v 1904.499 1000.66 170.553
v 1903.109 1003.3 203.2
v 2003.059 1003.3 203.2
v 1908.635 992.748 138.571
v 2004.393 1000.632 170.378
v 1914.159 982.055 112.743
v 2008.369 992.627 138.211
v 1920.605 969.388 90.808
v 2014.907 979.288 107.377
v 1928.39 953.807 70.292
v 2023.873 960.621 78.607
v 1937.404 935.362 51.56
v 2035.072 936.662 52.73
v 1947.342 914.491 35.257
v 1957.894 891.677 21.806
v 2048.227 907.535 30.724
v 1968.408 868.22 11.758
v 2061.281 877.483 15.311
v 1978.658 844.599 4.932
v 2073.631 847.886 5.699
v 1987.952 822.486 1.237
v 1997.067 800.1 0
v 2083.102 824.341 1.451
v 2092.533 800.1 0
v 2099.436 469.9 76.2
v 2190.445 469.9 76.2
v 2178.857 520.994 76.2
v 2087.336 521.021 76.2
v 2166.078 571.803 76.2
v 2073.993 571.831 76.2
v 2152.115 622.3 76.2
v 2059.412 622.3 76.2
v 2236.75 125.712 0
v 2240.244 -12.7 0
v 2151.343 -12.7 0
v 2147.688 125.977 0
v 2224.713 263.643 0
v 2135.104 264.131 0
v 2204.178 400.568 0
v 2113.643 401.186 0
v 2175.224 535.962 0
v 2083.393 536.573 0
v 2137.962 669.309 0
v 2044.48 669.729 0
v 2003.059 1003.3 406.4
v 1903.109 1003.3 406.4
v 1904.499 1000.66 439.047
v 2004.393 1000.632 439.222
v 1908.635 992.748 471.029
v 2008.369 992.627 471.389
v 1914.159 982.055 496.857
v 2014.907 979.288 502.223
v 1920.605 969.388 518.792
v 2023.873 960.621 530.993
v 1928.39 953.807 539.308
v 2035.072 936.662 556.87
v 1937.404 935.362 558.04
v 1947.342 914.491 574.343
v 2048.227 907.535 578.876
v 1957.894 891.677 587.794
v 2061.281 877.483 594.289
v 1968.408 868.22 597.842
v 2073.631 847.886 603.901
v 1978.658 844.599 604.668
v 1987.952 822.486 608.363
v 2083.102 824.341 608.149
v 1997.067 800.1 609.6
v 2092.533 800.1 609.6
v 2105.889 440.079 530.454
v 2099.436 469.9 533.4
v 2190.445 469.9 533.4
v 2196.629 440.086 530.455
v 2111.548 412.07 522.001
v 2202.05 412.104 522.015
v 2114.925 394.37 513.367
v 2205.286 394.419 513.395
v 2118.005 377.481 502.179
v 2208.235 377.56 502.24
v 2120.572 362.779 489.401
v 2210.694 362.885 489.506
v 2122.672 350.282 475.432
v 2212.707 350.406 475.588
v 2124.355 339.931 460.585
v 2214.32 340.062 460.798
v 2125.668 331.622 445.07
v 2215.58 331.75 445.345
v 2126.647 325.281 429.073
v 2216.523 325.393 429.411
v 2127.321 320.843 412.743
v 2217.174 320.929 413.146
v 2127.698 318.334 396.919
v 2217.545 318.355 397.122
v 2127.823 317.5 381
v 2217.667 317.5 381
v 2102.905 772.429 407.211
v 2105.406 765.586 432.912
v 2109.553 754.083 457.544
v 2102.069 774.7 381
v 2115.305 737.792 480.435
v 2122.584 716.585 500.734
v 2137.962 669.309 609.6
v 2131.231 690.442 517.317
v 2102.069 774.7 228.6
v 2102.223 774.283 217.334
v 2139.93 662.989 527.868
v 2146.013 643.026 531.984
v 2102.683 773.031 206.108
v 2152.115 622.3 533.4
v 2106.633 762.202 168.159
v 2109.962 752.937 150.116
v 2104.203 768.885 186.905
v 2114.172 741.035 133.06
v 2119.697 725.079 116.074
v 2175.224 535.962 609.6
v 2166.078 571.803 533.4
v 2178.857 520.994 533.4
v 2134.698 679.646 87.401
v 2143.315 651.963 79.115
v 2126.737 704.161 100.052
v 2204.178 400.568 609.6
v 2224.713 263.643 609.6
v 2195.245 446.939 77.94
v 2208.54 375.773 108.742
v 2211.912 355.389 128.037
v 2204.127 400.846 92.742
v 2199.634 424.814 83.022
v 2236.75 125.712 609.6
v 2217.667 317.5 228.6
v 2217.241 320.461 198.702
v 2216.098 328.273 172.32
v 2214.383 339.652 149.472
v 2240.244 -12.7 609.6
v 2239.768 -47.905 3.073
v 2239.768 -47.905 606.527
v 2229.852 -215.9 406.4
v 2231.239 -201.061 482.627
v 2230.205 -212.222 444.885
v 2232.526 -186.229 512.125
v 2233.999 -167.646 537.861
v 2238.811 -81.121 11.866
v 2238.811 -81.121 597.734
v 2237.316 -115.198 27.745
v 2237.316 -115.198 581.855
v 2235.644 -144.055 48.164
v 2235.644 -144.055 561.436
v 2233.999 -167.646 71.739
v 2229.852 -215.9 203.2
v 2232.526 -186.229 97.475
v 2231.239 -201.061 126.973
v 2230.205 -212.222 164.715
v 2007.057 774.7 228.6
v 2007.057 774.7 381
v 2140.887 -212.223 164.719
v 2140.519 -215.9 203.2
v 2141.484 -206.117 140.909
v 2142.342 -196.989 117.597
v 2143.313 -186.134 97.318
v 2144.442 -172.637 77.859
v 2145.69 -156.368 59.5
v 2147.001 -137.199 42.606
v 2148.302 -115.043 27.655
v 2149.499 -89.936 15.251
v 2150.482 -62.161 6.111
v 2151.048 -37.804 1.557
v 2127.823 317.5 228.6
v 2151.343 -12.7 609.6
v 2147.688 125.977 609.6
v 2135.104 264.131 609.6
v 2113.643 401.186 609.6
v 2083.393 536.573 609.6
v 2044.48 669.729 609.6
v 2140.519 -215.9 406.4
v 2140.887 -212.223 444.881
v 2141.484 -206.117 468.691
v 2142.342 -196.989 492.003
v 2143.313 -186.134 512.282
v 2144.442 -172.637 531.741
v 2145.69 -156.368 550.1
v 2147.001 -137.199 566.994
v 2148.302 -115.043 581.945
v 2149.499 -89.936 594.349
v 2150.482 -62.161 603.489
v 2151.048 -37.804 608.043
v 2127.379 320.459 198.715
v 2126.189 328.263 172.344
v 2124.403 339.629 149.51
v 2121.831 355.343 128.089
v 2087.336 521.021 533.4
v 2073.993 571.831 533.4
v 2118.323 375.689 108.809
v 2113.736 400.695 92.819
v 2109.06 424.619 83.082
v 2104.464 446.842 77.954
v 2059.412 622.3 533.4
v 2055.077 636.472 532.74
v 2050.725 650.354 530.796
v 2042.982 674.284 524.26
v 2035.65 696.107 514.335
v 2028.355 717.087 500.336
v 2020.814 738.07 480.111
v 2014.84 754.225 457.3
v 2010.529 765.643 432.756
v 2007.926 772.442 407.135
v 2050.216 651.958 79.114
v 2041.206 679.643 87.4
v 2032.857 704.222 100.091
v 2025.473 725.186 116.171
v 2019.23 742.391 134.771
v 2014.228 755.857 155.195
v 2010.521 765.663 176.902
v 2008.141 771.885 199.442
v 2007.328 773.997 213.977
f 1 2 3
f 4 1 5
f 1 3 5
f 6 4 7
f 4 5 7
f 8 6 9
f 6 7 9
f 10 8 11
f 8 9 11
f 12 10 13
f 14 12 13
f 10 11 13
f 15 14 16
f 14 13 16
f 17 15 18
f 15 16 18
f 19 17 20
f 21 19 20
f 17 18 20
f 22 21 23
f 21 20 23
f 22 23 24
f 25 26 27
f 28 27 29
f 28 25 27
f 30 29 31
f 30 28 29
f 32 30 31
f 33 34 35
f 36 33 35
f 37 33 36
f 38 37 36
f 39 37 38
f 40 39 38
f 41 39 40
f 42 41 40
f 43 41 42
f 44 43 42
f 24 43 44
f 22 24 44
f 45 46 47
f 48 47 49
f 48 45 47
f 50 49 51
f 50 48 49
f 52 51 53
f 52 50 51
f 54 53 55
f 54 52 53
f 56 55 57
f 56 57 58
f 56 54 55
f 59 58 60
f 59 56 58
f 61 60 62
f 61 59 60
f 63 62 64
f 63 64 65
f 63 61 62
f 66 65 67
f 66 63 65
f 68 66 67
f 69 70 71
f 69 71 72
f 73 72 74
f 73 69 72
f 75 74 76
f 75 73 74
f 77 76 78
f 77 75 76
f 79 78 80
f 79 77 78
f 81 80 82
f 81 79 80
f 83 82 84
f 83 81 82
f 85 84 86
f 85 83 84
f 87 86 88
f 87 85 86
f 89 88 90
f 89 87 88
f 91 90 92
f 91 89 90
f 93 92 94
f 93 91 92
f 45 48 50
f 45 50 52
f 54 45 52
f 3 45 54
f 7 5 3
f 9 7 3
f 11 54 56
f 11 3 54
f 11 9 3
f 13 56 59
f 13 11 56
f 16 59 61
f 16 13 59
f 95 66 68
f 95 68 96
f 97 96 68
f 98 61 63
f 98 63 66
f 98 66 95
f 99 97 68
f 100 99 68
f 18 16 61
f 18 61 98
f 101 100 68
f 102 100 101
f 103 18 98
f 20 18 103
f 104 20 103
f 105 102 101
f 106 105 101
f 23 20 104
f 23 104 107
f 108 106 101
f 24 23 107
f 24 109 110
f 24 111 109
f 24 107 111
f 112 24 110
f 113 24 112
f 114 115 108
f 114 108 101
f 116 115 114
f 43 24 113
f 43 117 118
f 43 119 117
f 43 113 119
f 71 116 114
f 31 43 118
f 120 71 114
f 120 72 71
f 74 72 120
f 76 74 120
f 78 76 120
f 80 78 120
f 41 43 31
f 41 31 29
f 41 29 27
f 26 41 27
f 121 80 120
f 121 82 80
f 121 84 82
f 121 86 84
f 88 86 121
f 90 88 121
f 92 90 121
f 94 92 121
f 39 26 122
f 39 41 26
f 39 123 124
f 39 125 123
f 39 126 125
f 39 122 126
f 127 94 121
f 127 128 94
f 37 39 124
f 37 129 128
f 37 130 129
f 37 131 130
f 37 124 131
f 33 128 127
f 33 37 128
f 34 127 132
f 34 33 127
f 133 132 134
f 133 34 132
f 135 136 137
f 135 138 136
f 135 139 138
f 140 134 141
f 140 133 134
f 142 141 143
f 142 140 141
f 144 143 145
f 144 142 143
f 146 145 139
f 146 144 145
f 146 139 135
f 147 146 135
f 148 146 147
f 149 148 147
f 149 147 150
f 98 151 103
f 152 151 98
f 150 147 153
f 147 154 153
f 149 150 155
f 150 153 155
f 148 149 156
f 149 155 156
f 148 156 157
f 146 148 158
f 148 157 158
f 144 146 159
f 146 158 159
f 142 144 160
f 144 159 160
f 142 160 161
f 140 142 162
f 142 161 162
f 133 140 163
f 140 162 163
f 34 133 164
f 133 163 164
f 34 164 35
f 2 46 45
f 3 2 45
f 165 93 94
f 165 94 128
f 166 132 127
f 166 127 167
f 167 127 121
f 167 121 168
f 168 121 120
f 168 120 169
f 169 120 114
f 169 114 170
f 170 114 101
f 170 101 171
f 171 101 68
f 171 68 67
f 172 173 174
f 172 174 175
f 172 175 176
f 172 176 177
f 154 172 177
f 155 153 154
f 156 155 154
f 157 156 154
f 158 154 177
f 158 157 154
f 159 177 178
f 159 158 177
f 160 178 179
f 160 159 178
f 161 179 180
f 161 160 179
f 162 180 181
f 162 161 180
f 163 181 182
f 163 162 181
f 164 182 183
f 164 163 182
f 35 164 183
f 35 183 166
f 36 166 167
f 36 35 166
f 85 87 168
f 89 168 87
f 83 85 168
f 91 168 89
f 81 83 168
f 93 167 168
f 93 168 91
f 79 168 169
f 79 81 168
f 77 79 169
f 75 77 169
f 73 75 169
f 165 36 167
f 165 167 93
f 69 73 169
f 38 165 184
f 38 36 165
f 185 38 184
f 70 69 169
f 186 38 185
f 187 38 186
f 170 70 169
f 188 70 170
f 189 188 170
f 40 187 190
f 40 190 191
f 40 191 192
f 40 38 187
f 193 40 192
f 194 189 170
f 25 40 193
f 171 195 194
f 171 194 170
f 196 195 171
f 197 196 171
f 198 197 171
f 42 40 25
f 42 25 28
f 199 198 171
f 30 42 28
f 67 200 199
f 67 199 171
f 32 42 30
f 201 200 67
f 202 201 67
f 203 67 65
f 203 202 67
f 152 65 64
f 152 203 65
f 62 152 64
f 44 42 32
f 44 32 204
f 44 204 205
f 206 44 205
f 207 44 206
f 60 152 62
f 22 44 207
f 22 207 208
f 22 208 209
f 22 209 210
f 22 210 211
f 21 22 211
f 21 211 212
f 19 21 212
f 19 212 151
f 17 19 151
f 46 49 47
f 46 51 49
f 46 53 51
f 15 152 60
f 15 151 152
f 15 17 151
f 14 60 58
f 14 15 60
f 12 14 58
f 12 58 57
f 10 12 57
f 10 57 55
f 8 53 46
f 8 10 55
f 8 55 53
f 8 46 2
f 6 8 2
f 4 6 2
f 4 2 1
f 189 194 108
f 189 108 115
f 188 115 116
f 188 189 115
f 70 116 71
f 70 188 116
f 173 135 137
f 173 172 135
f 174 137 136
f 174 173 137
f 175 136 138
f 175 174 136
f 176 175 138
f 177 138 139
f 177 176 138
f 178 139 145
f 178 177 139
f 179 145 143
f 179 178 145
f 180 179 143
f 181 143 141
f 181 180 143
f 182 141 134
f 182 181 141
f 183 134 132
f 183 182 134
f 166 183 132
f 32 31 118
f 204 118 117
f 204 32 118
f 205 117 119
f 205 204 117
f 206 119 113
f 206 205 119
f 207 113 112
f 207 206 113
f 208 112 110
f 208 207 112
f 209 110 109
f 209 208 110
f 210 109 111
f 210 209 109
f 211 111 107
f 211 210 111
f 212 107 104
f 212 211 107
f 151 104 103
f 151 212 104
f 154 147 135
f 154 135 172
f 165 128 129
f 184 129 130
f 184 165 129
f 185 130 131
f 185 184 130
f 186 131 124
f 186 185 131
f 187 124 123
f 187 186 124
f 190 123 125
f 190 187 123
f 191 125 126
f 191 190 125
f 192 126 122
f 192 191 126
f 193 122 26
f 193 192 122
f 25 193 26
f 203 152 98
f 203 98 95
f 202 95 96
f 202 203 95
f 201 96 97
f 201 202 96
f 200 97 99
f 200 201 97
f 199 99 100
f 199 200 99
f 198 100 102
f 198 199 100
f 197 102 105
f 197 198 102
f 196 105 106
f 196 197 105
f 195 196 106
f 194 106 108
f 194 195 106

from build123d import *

# Parameters (mm, degrees)
BOSS_EXTRUDE2_DEPTH     = 609.6
FILLET1_R               = 203.2
CUT_EXTRUDE1_DEPTH      = 2530.244458167
CUT_EXTRUDE1_DEPTH_BACK = 2530.244458167


with BuildPart() as part:
    # Sketch1 → Boss-Extrude2 (new body)
    with BuildSketch(Plane.XY):
        with BuildLine():
            Line((1903.109301748, 1003.3), (2003.058558405, 1003.3))
            ThreePointArc((2003.058558405, 1003.3), (2202.497656801, 409.705443199), (2229.852387132, -215.9))
            Line((2229.852387132, -215.9), (2140.519351559, -215.9))
            ThreePointArc((2140.519351559, -215.9), (2111.716205237, 411.206241365), (1903.109301748, 1003.3))
        make_face()
    extrude(amount=BOSS_EXTRUDE2_DEPTH)

    # Fillet1
    fillet1_edges = [part.edges().sort_by_distance(p)[0] for p in [
        (2185.185869346, -215.9, 609.6),
        (2185.185869346, -215.9, 0),
        (1953.083930077, 1003.3, 0),
        (1953.083930077, 1003.3, 609.6),
    ]]
    fillet(fillet1_edges, radius=FILLET1_R)

    # Sketch2 → Cut-Extrude1 (cut, two sides: drawn at the far end of the back side and taken through both)
    with BuildSketch(Plane(origin=(0, 0, 0), x_dir=(0, 0, -1), z_dir=(1, 0, 0)).offset(-CUT_EXTRUDE1_DEPTH_BACK)):
        with BuildLine():
            Line((-381, 317.5), (-228.6, 317.5))
            ThreePointArc((-228.6, 317.5), (-120.836926547, 362.136926547), (-76.2, 469.9))
            Line((-76.2, 469.9), (-76.2, 622.3))
            ThreePointArc((-76.2, 622.3), (-120.836926547, 730.063073453), (-228.6, 774.7))
            Line((-228.6, 774.7), (-381, 774.7))
            ThreePointArc((-381, 774.7), (-488.763073453, 730.063073453), (-533.4, 622.3))
            Line((-533.4, 622.3), (-533.4, 469.9))
            ThreePointArc((-533.4, 469.9), (-488.763073453, 362.136926547), (-381, 317.5))
        make_face()
    extrude(amount=CUT_EXTRUDE1_DEPTH + CUT_EXTRUDE1_DEPTH_BACK, mode=Mode.SUBTRACT)


solid = part.part
